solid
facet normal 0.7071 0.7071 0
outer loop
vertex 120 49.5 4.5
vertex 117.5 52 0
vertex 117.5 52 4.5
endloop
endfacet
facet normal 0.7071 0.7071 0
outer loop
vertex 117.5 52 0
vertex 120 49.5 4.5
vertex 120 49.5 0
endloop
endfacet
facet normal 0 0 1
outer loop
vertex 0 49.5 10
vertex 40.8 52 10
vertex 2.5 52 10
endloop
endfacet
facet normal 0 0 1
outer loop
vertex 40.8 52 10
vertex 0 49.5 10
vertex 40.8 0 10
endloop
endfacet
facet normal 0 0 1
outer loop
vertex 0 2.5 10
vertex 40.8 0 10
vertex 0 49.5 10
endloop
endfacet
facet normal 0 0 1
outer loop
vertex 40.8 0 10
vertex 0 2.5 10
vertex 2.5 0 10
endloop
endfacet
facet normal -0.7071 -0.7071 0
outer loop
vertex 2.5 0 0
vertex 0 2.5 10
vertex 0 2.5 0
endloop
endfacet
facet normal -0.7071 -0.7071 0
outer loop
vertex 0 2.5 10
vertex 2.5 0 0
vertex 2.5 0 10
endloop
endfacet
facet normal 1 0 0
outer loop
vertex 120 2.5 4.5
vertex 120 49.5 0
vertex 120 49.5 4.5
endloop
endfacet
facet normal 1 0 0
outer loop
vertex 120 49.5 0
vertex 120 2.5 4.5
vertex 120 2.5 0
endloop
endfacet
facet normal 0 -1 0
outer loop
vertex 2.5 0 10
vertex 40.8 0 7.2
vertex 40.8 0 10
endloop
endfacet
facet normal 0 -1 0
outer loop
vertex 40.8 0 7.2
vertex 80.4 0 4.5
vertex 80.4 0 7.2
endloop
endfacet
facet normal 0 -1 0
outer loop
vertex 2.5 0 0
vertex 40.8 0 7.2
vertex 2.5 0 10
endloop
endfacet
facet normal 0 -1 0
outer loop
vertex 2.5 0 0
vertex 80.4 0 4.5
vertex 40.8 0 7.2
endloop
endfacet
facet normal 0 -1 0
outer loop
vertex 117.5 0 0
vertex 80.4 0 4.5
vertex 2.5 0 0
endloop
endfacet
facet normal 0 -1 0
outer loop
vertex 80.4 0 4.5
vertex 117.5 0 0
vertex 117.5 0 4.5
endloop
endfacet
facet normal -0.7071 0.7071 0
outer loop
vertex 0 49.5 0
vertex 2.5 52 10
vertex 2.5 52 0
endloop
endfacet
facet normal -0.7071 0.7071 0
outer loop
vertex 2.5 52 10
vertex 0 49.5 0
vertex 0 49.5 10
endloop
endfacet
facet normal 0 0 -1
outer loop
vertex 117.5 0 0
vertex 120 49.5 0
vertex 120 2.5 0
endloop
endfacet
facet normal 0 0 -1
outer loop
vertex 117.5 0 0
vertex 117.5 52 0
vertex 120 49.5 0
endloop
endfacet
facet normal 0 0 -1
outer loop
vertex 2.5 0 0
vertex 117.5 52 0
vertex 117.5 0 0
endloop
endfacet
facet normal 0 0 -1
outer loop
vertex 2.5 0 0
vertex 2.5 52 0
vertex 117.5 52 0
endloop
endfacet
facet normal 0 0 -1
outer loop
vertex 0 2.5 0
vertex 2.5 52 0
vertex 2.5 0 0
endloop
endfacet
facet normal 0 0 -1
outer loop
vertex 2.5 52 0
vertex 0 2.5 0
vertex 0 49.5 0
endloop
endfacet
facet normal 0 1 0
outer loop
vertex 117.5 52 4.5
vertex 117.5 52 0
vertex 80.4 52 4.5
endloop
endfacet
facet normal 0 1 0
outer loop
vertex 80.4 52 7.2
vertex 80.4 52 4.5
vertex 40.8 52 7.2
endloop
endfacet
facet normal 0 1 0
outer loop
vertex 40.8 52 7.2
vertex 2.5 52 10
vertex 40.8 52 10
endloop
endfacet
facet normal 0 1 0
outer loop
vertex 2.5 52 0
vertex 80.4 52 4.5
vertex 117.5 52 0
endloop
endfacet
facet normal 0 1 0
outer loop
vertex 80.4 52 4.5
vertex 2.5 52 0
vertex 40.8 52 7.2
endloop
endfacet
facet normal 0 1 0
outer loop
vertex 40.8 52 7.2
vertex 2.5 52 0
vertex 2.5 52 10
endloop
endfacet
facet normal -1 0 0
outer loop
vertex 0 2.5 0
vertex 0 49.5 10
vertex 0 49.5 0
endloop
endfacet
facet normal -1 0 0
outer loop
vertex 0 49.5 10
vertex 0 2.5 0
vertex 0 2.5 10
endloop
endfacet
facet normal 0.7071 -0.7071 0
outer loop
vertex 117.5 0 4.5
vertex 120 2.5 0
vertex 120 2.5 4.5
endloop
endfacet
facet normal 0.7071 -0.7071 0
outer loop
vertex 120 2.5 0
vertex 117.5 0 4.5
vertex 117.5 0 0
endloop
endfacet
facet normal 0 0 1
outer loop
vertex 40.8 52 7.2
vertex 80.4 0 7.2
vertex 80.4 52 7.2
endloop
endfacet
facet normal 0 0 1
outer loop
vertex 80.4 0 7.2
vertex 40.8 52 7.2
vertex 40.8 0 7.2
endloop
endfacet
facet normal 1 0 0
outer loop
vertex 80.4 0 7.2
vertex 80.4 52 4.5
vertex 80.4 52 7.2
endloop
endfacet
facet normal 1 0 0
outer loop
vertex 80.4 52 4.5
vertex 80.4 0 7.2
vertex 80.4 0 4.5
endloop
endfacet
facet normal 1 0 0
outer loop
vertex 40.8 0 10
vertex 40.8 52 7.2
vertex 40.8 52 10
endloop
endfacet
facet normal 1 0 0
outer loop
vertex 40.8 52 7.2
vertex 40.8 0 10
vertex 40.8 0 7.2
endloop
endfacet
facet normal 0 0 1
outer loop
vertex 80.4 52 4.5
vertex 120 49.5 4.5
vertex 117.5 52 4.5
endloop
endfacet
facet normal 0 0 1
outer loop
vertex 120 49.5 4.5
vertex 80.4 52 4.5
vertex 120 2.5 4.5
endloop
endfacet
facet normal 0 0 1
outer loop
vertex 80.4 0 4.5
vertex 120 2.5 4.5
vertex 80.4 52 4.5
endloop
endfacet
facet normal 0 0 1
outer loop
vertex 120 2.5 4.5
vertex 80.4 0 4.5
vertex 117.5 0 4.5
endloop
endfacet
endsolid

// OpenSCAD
$fn = 32;

// ----------------------------------------------------------------------
// Stepped bar: twostep, 120 x 52 x 10/4.5 mm
// ----------------------------------------------------------------------

// --- parameters (mm) ---
bar_l = 120;              // bar length, X
bar_w = 52;               // bar width, Y
plate_t = 10;             // thickness of the thick zone, Z
thin_t = 4.5;             // thickness of the thin zone
corner_c = 2.5;           // corner chamfer of the bar
step_cut = 5.5;           // material removed from the thin zone
stair1_x = 40.8;          // position of the first stair
stair2_x = 80.4;          // position of the second stair
mid_t = 7.2;              // thickness of the middle zone
depth_1 = 2.8;            // depth of cut 1 from the top face
depth_2 = 5.5;            // depth of cut 2 from the top face
fit_tol = 0.02;           // declared fit tolerance (prompt contract)
free_tol = 0.2;           // declared free tolerance (prompt contract)

profile = [[2.5, 0], [117.5, 0], [120, 2.5], [120, 49.5], [117.5, 52], [2.5, 52], [0, 49.5], [0, 2.5]];  // primary outline, 8 points, counter clockwise
void_1 = [[40.8, -1], [80.4, -1], [80.4, 53], [40.8, 53]];  // first stair, 4 points
void_2 = [[80.4, -1], [121, -1], [121, 53], [80.4, 53]];  // second stair, 4 points

// --- the one profile operation ---
difference() {
  linear_extrude(height = plate_t) polygon(points = profile);
  translate([0, 0, plate_t - depth_1])
    linear_extrude(height = depth_1 + 1) polygon(points = void_1);
  translate([0, 0, plate_t - depth_2])
    linear_extrude(height = depth_2 + 1) polygon(points = void_2);
}
